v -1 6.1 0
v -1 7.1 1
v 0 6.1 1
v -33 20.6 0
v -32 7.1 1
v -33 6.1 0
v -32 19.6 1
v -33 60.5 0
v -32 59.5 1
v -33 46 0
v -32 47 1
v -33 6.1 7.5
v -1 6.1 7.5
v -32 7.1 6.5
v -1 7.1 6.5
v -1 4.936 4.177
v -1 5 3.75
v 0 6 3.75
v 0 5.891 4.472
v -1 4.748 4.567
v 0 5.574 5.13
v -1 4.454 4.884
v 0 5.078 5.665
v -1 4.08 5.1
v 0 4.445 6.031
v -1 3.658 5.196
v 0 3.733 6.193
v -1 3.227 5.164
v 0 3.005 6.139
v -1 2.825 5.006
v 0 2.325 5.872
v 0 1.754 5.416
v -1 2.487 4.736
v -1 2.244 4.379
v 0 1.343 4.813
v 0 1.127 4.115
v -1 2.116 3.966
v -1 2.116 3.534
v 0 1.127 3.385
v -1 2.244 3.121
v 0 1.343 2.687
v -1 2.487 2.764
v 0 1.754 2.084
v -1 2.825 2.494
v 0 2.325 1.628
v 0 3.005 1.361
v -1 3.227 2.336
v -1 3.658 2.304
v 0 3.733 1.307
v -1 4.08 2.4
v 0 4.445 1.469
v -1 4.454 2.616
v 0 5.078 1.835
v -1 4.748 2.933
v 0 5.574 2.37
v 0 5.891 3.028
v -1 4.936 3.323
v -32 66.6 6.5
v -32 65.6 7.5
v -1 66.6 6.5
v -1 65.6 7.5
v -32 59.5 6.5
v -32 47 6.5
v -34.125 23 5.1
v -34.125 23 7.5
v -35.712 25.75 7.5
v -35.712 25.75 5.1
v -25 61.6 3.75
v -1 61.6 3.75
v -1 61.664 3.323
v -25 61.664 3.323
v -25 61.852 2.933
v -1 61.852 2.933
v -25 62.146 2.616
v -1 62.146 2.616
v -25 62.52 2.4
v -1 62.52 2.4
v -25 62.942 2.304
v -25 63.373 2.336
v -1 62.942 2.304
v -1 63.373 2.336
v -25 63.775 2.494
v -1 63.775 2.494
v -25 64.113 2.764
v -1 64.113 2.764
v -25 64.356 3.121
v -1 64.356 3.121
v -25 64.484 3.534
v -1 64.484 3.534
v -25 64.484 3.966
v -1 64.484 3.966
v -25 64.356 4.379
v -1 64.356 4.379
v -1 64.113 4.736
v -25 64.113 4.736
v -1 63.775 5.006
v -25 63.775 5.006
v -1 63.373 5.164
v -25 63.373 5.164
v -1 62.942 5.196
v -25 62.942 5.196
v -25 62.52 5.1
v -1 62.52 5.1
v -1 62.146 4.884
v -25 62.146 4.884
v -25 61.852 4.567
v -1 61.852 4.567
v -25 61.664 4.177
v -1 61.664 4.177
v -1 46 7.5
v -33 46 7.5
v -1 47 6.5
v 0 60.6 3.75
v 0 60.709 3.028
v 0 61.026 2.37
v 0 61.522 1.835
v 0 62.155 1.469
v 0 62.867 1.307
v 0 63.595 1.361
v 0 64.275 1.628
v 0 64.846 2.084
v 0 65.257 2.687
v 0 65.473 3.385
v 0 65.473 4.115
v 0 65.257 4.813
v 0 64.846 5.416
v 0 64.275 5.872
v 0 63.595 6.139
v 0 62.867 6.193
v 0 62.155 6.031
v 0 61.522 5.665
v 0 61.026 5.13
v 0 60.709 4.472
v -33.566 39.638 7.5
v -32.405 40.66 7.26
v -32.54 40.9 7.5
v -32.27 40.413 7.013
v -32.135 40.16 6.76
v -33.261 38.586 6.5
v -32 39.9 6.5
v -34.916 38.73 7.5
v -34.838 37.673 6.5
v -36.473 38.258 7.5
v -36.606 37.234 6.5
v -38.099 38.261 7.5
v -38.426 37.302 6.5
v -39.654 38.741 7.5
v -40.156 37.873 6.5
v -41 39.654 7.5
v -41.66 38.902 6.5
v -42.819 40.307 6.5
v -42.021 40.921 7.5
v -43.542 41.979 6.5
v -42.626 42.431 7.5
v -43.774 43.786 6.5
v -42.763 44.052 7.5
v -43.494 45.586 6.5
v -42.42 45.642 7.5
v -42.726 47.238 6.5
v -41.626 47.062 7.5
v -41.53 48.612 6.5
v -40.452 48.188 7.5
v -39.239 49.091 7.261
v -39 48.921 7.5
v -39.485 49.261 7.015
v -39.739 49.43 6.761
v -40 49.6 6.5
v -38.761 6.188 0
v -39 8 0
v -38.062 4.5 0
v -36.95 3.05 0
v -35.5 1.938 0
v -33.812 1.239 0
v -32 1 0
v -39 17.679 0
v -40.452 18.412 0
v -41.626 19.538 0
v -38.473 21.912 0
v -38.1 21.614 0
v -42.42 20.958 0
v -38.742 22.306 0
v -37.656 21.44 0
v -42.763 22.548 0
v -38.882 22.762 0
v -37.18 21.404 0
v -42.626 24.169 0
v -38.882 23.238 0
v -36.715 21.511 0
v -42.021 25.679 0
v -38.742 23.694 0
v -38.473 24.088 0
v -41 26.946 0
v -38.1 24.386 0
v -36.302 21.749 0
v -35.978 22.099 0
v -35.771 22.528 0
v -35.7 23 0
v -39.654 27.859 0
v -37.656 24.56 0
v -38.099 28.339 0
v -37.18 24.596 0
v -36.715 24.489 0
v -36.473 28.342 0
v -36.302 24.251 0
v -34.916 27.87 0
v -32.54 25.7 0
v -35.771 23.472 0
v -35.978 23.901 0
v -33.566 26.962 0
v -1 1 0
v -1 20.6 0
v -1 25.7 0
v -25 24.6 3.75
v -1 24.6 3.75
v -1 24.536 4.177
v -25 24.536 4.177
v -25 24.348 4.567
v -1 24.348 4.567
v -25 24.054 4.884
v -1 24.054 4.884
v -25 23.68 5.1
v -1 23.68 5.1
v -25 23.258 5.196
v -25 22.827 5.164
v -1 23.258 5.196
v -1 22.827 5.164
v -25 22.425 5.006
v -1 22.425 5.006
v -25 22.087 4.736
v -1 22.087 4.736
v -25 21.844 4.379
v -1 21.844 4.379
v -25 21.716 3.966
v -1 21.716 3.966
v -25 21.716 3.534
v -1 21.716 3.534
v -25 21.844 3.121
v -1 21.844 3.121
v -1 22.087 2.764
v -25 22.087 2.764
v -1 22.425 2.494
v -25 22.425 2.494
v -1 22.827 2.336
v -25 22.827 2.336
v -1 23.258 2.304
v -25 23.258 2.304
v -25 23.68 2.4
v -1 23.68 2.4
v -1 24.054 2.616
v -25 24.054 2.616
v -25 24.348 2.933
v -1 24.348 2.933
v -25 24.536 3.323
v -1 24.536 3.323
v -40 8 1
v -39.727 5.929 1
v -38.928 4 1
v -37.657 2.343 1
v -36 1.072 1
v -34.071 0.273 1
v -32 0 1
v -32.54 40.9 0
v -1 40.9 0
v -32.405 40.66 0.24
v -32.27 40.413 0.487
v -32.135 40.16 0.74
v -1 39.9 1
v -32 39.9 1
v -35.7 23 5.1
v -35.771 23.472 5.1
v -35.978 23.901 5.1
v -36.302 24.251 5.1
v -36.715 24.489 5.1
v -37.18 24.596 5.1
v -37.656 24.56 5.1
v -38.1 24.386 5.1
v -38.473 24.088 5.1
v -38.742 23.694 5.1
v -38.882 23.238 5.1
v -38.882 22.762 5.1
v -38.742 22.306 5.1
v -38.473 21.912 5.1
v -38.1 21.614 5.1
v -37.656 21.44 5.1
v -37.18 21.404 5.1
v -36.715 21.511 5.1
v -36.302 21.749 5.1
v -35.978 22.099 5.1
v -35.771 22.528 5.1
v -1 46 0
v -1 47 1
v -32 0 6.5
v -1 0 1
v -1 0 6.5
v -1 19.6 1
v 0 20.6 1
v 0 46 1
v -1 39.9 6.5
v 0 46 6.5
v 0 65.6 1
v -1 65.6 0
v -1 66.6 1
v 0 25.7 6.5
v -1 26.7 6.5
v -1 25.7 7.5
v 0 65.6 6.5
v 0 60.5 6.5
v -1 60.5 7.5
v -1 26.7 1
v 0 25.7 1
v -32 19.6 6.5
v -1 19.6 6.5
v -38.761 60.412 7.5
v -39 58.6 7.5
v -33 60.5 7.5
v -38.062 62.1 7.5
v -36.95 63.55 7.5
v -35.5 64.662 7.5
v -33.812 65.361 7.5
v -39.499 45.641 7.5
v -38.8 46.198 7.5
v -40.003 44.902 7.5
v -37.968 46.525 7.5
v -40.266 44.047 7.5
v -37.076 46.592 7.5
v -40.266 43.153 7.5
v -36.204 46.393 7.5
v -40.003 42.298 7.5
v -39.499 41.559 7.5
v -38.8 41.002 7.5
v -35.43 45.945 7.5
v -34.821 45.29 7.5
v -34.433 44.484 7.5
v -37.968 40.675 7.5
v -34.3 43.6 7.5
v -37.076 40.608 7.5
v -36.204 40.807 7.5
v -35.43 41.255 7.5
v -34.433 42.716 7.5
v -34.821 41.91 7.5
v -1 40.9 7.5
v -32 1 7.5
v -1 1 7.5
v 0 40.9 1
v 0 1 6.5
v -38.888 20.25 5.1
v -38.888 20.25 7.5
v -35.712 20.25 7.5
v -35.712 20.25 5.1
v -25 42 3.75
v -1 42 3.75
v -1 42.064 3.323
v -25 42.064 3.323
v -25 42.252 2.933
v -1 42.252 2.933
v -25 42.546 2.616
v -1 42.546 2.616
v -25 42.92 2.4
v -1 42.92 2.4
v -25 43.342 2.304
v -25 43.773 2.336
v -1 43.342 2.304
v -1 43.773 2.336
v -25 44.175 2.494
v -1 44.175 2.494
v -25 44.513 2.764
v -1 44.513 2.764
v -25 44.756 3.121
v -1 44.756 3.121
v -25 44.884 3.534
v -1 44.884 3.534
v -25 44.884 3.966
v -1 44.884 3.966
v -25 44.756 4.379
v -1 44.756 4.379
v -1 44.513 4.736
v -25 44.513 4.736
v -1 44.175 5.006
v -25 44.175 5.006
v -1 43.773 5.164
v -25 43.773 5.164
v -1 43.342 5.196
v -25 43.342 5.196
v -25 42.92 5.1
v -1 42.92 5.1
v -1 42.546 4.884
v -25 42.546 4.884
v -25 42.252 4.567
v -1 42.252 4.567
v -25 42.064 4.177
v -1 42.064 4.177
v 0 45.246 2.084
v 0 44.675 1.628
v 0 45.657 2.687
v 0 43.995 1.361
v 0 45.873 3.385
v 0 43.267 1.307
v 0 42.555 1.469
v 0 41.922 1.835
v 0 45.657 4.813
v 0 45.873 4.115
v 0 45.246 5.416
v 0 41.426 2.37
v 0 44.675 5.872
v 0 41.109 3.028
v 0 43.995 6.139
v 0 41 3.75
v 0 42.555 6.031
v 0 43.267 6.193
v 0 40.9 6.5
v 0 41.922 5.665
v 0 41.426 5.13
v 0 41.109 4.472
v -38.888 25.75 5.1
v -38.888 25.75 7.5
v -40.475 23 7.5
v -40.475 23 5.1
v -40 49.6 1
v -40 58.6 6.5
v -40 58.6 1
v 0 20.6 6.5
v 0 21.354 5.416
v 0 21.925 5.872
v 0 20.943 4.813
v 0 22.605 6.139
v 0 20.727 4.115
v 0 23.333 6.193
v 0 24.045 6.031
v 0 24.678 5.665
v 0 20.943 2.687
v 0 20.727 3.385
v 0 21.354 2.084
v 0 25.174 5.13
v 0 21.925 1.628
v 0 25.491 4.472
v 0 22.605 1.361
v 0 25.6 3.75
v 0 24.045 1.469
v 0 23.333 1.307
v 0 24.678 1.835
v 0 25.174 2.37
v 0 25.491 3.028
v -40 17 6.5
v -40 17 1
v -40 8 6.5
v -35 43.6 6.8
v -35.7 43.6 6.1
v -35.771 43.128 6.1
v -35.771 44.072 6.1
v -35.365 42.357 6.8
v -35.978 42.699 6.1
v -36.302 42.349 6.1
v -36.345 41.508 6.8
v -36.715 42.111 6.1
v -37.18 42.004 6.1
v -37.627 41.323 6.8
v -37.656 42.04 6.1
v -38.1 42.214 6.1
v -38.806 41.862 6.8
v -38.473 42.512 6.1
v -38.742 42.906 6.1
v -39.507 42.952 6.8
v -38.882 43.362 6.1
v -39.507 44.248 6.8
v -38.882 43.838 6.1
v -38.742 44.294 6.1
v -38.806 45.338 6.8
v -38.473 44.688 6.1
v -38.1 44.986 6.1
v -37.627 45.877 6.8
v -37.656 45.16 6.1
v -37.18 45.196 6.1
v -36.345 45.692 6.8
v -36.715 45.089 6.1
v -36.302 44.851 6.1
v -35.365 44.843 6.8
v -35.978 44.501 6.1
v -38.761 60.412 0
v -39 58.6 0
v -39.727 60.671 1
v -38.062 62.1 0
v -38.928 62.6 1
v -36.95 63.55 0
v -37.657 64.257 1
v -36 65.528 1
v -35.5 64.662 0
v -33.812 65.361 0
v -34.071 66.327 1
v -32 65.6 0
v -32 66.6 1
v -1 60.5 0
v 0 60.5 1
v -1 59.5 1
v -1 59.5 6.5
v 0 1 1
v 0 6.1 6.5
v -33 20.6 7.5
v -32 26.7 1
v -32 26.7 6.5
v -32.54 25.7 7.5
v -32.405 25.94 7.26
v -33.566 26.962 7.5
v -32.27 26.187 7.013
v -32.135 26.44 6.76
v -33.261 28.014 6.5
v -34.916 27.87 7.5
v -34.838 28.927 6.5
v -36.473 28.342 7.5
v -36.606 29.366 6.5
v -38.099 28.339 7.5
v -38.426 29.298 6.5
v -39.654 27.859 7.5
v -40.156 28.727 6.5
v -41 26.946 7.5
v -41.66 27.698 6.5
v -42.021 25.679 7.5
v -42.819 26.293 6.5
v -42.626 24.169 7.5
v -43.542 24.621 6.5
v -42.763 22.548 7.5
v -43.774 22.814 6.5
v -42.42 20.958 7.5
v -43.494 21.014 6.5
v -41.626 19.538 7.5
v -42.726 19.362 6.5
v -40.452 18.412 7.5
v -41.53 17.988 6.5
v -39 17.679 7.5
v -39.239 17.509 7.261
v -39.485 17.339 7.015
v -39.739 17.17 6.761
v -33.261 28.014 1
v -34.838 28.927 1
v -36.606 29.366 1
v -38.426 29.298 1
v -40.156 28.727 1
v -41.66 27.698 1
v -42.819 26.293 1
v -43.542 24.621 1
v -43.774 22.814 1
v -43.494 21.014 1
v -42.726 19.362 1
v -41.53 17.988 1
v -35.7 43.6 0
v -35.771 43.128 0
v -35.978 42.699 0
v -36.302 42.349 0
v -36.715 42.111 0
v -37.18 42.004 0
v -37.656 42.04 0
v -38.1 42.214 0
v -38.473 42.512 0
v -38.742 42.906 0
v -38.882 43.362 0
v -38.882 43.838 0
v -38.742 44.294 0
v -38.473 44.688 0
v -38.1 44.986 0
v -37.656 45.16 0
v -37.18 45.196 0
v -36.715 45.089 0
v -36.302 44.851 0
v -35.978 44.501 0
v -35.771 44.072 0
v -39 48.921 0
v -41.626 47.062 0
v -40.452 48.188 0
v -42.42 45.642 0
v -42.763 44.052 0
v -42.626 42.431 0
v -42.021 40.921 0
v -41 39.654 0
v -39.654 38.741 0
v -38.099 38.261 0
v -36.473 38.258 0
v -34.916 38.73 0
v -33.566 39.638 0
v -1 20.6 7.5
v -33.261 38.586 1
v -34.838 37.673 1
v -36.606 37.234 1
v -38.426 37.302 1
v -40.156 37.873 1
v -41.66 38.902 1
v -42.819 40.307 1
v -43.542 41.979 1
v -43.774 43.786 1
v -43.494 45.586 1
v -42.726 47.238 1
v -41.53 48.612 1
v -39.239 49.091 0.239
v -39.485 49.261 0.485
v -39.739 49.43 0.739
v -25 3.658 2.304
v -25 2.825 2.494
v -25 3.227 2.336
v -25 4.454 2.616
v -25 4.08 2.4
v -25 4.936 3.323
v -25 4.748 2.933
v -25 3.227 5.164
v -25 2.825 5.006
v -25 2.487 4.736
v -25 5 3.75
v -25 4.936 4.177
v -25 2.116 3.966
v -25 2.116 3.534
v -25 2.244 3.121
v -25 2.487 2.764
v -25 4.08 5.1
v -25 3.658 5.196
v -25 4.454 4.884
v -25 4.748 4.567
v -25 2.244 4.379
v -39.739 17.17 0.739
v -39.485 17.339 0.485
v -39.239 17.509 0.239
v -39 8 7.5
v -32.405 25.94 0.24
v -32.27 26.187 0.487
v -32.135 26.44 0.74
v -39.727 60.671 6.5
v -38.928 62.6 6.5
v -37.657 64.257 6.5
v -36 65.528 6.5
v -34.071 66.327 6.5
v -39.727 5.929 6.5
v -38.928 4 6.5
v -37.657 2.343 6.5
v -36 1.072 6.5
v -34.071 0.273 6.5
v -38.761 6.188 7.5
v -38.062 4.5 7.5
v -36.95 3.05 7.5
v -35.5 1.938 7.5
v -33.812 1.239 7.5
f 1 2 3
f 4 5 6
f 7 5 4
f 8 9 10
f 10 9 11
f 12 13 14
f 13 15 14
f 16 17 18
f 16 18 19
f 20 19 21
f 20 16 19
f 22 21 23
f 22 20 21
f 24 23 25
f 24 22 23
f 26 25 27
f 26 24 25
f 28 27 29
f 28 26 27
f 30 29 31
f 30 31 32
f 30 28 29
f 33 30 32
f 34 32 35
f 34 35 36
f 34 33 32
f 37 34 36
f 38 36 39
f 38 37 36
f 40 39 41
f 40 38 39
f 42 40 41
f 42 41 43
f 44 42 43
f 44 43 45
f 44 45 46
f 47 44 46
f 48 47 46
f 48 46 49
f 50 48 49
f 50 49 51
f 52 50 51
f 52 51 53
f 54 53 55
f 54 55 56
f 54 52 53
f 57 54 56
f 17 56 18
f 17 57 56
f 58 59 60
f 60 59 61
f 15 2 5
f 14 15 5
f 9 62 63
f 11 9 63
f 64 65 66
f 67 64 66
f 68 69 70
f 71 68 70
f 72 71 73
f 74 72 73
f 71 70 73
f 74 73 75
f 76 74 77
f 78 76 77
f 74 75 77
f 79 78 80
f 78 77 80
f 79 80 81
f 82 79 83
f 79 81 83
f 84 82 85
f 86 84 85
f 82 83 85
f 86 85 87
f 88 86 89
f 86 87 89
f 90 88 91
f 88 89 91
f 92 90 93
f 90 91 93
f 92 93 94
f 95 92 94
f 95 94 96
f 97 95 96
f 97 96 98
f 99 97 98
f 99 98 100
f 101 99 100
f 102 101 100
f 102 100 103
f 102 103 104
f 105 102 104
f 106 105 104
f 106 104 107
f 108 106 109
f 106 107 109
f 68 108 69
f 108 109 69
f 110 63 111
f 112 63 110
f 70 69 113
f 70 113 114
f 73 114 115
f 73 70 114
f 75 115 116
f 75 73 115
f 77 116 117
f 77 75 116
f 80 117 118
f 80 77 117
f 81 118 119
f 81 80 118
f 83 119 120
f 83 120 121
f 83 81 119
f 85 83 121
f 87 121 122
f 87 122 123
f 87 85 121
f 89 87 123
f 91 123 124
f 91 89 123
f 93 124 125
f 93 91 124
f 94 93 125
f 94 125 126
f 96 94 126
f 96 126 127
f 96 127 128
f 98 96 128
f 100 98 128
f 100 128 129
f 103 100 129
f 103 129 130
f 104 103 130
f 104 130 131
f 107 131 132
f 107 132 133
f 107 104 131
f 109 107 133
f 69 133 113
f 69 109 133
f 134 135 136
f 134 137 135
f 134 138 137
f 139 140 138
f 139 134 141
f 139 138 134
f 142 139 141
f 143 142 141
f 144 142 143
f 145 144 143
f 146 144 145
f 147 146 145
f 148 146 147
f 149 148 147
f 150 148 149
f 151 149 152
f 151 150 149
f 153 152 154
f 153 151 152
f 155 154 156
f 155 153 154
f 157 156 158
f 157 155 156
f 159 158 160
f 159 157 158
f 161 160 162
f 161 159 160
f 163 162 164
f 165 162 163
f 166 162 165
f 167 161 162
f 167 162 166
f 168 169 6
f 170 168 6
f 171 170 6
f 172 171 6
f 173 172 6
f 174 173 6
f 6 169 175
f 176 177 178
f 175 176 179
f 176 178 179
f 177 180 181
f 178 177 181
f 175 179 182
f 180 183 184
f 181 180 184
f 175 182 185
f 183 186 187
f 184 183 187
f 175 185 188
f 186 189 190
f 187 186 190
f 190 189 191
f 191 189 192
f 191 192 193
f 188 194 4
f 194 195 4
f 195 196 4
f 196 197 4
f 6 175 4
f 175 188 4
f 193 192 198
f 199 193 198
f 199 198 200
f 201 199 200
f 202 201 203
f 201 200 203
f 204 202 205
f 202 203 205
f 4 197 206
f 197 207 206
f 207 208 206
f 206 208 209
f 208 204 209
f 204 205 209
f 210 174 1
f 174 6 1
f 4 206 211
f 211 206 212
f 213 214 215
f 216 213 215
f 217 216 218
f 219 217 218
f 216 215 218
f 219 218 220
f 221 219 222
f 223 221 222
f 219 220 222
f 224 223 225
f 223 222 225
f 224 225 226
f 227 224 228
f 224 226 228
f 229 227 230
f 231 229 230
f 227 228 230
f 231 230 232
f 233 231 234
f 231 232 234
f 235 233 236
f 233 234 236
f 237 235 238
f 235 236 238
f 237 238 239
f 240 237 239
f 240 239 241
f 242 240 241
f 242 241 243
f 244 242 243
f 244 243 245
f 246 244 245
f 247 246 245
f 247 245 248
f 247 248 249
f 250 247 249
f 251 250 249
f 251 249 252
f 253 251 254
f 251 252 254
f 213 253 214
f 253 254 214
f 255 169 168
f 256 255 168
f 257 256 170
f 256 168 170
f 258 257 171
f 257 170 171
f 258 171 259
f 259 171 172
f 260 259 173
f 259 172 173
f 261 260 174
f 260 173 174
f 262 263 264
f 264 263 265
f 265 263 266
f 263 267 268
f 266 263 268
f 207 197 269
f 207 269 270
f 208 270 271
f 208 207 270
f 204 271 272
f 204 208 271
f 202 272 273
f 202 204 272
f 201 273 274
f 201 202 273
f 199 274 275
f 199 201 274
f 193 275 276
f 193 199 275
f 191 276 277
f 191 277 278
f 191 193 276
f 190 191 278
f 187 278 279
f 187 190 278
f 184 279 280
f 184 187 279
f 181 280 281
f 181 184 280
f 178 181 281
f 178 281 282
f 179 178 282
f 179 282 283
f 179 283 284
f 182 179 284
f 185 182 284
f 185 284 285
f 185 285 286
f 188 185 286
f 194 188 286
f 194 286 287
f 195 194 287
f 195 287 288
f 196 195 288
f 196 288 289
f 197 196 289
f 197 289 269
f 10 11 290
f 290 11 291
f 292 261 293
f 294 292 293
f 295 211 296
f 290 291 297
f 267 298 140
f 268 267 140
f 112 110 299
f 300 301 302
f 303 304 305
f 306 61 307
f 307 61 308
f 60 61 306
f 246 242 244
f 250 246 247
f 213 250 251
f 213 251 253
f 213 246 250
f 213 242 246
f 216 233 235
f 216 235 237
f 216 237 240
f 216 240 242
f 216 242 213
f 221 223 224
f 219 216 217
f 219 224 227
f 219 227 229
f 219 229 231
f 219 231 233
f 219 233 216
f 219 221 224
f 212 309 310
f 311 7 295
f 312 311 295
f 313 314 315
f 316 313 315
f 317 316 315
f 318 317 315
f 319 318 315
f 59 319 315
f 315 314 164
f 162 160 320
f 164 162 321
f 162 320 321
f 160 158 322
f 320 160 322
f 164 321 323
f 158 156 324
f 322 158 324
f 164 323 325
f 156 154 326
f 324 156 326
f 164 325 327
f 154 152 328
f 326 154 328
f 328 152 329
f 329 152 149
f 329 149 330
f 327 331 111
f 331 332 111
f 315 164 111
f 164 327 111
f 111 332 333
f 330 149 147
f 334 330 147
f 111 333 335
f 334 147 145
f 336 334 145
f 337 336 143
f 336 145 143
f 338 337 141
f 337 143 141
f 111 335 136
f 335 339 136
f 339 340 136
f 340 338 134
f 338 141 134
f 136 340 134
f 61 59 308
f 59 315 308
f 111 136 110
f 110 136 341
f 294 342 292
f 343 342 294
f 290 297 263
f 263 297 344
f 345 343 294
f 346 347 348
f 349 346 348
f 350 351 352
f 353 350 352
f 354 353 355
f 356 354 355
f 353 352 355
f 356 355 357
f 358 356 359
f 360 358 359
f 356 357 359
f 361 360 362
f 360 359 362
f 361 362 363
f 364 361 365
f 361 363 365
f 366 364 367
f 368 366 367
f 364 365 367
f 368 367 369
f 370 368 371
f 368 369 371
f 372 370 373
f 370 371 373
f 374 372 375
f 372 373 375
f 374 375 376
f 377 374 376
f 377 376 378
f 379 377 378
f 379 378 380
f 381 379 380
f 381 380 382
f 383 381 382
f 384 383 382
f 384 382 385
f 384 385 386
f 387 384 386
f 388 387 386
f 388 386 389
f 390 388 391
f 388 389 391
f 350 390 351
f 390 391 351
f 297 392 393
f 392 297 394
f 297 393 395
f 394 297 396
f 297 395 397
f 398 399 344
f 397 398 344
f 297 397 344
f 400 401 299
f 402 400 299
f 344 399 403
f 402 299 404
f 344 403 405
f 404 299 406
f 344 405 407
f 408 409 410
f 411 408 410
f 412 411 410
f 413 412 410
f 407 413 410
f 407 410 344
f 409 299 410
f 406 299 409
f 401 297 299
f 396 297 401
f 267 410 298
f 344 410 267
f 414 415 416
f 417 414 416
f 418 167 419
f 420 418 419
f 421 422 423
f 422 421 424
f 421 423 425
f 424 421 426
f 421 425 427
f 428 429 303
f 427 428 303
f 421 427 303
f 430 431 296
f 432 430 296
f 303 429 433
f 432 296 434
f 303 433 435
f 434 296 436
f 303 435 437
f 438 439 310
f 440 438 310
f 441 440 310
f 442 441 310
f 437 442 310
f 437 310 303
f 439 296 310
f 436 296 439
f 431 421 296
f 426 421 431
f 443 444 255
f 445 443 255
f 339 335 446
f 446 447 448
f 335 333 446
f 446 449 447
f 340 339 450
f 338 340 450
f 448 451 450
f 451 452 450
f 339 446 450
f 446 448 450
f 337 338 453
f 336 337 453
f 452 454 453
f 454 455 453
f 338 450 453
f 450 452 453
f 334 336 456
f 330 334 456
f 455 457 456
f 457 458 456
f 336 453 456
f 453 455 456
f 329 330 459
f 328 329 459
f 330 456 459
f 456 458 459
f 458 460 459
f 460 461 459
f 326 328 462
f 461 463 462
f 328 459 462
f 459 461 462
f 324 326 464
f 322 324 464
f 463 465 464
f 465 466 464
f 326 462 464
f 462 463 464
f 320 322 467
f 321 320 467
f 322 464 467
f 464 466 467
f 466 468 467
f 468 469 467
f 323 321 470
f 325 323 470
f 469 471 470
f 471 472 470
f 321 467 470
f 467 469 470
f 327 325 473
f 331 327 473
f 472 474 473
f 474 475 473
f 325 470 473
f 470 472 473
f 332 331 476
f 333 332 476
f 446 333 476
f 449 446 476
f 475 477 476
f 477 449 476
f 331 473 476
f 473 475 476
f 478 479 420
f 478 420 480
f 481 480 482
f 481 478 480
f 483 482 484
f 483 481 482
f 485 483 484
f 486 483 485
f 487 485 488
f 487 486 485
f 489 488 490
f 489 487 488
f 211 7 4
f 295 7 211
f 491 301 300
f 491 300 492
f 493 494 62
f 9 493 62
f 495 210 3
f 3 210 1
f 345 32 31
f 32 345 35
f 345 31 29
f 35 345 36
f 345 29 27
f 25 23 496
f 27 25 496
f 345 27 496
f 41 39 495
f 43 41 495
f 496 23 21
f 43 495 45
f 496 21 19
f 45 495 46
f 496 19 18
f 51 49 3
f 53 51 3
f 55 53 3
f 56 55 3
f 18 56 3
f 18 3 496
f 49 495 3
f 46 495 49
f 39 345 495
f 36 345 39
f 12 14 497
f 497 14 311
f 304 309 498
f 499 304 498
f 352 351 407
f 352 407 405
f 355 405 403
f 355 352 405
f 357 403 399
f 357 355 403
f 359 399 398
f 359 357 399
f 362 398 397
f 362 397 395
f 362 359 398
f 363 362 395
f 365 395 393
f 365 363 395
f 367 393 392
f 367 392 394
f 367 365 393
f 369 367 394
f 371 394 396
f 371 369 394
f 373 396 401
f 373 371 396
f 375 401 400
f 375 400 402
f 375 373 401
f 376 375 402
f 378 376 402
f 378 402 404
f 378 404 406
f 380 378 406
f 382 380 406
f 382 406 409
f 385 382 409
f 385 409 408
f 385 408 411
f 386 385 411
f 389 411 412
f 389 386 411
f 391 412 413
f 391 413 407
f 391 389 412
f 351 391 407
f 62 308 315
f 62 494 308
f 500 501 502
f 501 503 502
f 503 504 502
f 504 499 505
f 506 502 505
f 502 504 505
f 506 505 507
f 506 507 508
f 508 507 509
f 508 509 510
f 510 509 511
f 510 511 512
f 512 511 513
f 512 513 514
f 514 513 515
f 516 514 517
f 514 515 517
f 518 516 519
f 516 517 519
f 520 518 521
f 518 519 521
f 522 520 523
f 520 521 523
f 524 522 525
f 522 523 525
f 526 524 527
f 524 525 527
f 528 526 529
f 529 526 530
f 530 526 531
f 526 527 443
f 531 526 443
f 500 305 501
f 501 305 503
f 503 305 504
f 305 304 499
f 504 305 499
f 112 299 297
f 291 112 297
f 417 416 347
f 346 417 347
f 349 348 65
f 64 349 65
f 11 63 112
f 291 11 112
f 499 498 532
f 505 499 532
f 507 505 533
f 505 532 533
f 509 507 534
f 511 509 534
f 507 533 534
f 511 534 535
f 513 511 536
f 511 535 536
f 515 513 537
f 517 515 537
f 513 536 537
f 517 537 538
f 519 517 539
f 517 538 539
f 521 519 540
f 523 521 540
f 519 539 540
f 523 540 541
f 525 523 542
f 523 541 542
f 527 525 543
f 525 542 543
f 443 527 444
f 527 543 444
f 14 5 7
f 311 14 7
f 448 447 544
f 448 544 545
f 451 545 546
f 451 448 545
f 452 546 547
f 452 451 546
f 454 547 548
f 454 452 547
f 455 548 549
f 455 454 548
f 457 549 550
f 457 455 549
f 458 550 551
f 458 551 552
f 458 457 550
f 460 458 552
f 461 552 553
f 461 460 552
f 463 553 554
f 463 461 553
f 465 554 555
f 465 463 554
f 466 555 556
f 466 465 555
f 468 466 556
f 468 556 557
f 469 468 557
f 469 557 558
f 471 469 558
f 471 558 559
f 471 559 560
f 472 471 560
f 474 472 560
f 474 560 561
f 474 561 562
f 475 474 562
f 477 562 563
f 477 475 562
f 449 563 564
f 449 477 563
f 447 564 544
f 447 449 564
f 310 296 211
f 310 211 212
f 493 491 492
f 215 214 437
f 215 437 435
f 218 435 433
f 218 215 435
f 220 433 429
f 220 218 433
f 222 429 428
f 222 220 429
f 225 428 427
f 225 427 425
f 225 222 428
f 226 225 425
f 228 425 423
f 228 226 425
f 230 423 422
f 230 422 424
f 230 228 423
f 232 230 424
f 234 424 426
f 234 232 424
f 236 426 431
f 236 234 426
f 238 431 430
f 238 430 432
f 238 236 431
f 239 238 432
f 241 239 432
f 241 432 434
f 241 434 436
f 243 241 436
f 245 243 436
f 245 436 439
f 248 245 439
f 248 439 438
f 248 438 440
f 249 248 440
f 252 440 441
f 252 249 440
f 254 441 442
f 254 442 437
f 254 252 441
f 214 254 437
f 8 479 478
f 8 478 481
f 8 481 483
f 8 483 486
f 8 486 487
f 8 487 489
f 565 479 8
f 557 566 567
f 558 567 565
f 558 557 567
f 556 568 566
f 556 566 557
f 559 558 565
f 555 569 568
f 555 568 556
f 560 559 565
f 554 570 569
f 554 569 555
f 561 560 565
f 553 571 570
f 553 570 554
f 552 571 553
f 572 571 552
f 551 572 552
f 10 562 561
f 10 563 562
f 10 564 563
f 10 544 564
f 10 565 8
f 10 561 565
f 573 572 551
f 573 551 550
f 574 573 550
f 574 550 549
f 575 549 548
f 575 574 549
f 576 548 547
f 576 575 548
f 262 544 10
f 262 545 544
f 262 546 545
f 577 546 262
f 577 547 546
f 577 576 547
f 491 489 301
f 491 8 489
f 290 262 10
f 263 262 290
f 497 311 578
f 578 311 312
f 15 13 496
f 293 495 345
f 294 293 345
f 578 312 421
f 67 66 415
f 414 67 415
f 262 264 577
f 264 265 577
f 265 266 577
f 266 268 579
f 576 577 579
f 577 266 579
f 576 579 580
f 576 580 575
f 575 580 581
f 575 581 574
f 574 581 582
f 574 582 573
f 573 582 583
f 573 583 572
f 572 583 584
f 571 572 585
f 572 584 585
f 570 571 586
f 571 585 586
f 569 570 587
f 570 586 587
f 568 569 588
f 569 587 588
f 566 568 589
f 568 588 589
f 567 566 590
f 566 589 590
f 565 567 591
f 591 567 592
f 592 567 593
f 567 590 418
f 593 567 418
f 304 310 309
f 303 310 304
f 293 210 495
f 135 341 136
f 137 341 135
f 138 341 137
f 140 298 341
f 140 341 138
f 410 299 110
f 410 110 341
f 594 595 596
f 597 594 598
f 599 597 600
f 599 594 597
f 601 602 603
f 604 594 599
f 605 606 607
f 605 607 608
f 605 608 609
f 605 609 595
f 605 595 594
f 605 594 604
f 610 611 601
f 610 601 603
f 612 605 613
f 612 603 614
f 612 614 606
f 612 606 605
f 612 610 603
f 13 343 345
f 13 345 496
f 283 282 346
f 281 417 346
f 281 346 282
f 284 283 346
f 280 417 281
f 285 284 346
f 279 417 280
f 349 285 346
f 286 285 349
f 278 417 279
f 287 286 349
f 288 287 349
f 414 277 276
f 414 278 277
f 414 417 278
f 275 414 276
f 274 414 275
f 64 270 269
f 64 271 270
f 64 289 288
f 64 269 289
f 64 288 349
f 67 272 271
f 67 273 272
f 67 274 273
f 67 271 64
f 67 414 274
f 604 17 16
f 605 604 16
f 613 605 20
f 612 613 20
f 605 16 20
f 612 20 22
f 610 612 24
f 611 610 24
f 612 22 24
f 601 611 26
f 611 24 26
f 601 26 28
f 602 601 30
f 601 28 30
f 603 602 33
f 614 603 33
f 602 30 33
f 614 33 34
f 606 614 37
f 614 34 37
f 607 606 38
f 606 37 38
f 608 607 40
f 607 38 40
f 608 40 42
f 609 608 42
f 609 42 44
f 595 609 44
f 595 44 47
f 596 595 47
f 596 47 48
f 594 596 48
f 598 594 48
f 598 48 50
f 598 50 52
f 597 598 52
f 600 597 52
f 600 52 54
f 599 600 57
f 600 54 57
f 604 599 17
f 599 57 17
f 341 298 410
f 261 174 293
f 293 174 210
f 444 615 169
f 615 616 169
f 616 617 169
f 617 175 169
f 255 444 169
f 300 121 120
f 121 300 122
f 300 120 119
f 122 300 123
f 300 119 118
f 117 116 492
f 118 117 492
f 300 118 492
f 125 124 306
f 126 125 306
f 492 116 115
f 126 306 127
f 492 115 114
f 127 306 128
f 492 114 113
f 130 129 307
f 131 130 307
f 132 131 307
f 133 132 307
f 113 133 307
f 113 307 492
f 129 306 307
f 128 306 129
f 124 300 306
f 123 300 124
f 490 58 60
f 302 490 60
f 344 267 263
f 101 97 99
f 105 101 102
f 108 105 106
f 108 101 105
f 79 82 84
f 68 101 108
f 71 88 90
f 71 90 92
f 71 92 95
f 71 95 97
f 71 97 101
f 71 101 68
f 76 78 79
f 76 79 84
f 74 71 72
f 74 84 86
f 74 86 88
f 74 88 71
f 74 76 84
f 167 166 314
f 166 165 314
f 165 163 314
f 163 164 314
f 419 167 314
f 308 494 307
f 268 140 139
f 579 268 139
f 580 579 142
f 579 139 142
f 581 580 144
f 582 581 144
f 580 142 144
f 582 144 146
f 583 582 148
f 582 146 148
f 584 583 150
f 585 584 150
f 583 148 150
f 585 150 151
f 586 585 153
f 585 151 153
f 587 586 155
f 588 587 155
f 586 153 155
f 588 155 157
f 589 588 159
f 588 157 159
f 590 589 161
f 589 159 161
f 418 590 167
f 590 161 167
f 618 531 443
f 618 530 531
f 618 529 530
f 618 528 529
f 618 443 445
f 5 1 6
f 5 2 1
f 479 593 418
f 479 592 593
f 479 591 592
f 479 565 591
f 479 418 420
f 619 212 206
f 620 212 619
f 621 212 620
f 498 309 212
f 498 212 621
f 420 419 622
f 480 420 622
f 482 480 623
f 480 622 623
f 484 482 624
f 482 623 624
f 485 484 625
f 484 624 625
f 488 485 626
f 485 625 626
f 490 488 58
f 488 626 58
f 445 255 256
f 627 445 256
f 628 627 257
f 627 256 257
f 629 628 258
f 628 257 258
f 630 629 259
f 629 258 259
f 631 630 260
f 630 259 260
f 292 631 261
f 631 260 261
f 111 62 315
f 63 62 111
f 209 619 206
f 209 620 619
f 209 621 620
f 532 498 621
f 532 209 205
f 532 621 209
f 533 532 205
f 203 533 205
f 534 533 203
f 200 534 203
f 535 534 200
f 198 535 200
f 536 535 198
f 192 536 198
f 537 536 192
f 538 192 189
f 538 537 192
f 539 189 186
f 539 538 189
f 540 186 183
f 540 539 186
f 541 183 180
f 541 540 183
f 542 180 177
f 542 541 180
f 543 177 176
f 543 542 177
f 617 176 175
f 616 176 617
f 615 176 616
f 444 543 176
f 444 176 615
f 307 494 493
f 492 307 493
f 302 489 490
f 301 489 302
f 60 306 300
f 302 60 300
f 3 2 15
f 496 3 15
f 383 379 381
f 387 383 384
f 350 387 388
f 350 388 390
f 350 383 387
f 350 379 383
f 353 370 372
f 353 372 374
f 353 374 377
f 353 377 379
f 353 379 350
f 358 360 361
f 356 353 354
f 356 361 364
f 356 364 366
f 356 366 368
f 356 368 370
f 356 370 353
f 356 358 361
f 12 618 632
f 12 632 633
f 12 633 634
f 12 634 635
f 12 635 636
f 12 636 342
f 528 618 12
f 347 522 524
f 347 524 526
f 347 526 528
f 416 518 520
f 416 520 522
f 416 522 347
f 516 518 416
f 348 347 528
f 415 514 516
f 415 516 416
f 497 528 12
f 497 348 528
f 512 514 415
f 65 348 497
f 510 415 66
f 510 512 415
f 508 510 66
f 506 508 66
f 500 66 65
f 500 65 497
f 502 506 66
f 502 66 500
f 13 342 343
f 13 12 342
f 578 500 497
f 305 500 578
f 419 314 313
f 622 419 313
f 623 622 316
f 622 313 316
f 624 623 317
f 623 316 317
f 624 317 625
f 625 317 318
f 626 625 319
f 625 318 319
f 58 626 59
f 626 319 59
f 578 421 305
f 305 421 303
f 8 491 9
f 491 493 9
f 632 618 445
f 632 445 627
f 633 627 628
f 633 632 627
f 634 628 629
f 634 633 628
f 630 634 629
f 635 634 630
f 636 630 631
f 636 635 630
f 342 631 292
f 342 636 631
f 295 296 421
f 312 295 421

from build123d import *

# Parameters (mm, degrees)
F0_R     = 1.6
F1_DEPTH = 7.5
F2_R     = 1.45
F3_DEPTH = 25
F4_SIZE  = 1
F6_ANGLE = 180
F7_R     = 1.6
F8_DEPTH = 2.4
F9_SIZE  = 1.4


with BuildPart() as f1:
    # F0 (on Top) → F1 (new body)
    with BuildSketch(Plane.XY):
        with BuildLine():
            Line((-32, 0), (0, 0))
            Line((0, 0), (0, 7.1))
            Line((0, 7.1), (-32, 7.1))
            Line((-32, 7.1), (-32, 19.6))
            Line((-32, 19.6), (0, 19.6))
            Line((0, 19.6), (0, 26.7))
            Line((0, 26.7), (-32, 26.7))
            ThreePointArc((-32, 26.7), (-42.2886559839, 27.0365203991), (-40, 17))
            Line((-40, 17), (-40, 8))
            ThreePointArc((-40, 8), (-37.6568542495, 2.3431457505), (-32, 0))
        make_face()
        with Locations((-37.3, 23)):
            Circle(F0_R, mode=Mode.SUBTRACT)
    extrude(amount=F1_DEPTH)

    # F2 (on face) → F3 (cut)
    with BuildSketch(Plane.YZ):
        with Locations((3.55, 3.75)):
            Circle(F2_R)
        with Locations((23.15, 3.75)):
            Circle(F2_R)
    extrude(amount=-F3_DEPTH, mode=Mode.SUBTRACT)

    # F4
    f4_edges = [f1.edges().sort_by_distance(p)[0] for p in [
        (-16, 0, 7.5),
        (-16, 0, 0),
        (-16, 7.1, 7.5),
        (-16, 7.1, 0),
        (-16, 26.7, 0),
        (-16, 26.7, 7.5),
        (-16, 19.6, 7.5),
        (-16, 19.6, 0),
        (-32, 13.35, 0),
        (-32, 13.35, 7.5),
        (-42.288656, 27.03652, 0),
        (-42.288656, 27.03652, 7.5),
        (0, 26.7, 3.75),
        (0, 23.15, 0),
        (0, 19.6, 3.75),
        (0, 23.15, 7.5),
        (0, 3.55, 7.5),
        (0, 7.1, 3.75),
        (0, 3.55, 0),
        (0, 0, 3.75),
        (0, 2.1, 3.75),
        (0, 21.7, 3.75),
    ]]
    chamfer(f4_edges, length=F4_SIZE)


with BuildPart() as f5_1:
    # F5: copy of F1
    add(f1.part.moved(Location((0, 59.5, 0))))


with BuildPart() as f5_1_1:
    # F6: moved
    add(f5_1.part.rotate(Axis((0, 63.05, 3.75), (1, 0, 0)), F6_ANGLE))

    # F9
    f9_edges = [f5_1_1.edges().sort_by_distance(p)[0] for p in [
        (-38.9, 43.6, 7.5),
    ]]
    chamfer(f9_edges, length=F9_SIZE)


with BuildPart() as f1_1:
    add(f1.part)

    # F7 (on face) → F8 (cut)
    with BuildSketch(Plane.XY.offset(7.5)):
        Polygon((-35.7122867597, 25.75), (-38.8877132403, 25.75), (-40.4754264805, 23), (-38.8877132403, 20.25), (-35.7122867597, 20.25), (-34.1245735195, 23), align=None)
        with Locations((-37.3, 23)):
            Circle(F7_R, mode=Mode.SUBTRACT)
    extrude(amount=-F8_DEPTH, mode=Mode.SUBTRACT)


solid = Compound([f5_1_1.part, f1_1.part])
